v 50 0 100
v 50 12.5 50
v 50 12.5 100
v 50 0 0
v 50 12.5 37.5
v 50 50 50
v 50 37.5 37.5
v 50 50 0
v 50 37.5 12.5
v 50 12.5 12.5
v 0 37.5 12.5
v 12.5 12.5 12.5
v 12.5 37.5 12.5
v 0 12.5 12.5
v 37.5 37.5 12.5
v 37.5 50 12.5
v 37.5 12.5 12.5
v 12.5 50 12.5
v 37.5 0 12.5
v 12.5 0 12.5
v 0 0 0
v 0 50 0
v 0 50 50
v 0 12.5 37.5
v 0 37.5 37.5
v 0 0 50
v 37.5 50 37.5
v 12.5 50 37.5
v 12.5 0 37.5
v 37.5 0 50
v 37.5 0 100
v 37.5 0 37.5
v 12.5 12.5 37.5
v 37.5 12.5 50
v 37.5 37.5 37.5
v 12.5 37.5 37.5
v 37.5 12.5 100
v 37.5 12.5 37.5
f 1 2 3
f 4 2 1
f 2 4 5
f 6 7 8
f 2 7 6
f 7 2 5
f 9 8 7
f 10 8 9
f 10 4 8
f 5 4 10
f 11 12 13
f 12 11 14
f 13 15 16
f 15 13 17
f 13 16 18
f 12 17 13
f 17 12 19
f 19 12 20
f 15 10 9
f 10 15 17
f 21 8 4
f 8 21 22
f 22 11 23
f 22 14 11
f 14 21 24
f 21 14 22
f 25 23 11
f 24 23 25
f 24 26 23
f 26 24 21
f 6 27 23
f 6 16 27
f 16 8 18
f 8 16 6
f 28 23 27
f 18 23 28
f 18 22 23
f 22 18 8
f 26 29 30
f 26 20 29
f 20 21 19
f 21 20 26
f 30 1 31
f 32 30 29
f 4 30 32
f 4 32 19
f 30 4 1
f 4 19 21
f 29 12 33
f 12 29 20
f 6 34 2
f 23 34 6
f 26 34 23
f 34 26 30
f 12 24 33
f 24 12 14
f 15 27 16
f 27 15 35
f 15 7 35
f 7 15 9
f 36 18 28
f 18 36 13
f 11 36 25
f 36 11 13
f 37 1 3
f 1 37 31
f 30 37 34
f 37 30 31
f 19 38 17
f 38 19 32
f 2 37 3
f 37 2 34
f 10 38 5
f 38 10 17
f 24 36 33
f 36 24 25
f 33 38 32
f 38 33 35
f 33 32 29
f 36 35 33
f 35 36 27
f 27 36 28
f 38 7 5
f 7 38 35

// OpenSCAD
edge = 50;
pillars= edge/4;

translate( v = [0,
                0,
                0] ) {
    cube(
        [edge,
        edge,
        pillars,
        ],
        center=false);
}

translate( v = [0,
                0,
                0] ) {
    cube(
        [pillars,
        pillars,
        edge,
        ],
        center=false);
}

    
translate( v = [edge - pillars,
                edge - pillars,
                0] ) {
    cube(
        [pillars,
        pillars,
        edge,
        ],
        center=false);
}

translate( v = [0,
                edge - pillars,
                0] ) {
    cube(
        [pillars,
        pillars,
        edge,
        ],
        center=false);
}

translate( v = [edge - pillars,
                0,
                0] ) {
    cube(
        [pillars,
        pillars,
        2* edge,
        ],
        center=false);
}

// Top
translate( v = [0,
                0, 
                edge - pillars] ) {
    cube(
        [edge,
        edge,
        pillars,
        ],
        center=false);
}
